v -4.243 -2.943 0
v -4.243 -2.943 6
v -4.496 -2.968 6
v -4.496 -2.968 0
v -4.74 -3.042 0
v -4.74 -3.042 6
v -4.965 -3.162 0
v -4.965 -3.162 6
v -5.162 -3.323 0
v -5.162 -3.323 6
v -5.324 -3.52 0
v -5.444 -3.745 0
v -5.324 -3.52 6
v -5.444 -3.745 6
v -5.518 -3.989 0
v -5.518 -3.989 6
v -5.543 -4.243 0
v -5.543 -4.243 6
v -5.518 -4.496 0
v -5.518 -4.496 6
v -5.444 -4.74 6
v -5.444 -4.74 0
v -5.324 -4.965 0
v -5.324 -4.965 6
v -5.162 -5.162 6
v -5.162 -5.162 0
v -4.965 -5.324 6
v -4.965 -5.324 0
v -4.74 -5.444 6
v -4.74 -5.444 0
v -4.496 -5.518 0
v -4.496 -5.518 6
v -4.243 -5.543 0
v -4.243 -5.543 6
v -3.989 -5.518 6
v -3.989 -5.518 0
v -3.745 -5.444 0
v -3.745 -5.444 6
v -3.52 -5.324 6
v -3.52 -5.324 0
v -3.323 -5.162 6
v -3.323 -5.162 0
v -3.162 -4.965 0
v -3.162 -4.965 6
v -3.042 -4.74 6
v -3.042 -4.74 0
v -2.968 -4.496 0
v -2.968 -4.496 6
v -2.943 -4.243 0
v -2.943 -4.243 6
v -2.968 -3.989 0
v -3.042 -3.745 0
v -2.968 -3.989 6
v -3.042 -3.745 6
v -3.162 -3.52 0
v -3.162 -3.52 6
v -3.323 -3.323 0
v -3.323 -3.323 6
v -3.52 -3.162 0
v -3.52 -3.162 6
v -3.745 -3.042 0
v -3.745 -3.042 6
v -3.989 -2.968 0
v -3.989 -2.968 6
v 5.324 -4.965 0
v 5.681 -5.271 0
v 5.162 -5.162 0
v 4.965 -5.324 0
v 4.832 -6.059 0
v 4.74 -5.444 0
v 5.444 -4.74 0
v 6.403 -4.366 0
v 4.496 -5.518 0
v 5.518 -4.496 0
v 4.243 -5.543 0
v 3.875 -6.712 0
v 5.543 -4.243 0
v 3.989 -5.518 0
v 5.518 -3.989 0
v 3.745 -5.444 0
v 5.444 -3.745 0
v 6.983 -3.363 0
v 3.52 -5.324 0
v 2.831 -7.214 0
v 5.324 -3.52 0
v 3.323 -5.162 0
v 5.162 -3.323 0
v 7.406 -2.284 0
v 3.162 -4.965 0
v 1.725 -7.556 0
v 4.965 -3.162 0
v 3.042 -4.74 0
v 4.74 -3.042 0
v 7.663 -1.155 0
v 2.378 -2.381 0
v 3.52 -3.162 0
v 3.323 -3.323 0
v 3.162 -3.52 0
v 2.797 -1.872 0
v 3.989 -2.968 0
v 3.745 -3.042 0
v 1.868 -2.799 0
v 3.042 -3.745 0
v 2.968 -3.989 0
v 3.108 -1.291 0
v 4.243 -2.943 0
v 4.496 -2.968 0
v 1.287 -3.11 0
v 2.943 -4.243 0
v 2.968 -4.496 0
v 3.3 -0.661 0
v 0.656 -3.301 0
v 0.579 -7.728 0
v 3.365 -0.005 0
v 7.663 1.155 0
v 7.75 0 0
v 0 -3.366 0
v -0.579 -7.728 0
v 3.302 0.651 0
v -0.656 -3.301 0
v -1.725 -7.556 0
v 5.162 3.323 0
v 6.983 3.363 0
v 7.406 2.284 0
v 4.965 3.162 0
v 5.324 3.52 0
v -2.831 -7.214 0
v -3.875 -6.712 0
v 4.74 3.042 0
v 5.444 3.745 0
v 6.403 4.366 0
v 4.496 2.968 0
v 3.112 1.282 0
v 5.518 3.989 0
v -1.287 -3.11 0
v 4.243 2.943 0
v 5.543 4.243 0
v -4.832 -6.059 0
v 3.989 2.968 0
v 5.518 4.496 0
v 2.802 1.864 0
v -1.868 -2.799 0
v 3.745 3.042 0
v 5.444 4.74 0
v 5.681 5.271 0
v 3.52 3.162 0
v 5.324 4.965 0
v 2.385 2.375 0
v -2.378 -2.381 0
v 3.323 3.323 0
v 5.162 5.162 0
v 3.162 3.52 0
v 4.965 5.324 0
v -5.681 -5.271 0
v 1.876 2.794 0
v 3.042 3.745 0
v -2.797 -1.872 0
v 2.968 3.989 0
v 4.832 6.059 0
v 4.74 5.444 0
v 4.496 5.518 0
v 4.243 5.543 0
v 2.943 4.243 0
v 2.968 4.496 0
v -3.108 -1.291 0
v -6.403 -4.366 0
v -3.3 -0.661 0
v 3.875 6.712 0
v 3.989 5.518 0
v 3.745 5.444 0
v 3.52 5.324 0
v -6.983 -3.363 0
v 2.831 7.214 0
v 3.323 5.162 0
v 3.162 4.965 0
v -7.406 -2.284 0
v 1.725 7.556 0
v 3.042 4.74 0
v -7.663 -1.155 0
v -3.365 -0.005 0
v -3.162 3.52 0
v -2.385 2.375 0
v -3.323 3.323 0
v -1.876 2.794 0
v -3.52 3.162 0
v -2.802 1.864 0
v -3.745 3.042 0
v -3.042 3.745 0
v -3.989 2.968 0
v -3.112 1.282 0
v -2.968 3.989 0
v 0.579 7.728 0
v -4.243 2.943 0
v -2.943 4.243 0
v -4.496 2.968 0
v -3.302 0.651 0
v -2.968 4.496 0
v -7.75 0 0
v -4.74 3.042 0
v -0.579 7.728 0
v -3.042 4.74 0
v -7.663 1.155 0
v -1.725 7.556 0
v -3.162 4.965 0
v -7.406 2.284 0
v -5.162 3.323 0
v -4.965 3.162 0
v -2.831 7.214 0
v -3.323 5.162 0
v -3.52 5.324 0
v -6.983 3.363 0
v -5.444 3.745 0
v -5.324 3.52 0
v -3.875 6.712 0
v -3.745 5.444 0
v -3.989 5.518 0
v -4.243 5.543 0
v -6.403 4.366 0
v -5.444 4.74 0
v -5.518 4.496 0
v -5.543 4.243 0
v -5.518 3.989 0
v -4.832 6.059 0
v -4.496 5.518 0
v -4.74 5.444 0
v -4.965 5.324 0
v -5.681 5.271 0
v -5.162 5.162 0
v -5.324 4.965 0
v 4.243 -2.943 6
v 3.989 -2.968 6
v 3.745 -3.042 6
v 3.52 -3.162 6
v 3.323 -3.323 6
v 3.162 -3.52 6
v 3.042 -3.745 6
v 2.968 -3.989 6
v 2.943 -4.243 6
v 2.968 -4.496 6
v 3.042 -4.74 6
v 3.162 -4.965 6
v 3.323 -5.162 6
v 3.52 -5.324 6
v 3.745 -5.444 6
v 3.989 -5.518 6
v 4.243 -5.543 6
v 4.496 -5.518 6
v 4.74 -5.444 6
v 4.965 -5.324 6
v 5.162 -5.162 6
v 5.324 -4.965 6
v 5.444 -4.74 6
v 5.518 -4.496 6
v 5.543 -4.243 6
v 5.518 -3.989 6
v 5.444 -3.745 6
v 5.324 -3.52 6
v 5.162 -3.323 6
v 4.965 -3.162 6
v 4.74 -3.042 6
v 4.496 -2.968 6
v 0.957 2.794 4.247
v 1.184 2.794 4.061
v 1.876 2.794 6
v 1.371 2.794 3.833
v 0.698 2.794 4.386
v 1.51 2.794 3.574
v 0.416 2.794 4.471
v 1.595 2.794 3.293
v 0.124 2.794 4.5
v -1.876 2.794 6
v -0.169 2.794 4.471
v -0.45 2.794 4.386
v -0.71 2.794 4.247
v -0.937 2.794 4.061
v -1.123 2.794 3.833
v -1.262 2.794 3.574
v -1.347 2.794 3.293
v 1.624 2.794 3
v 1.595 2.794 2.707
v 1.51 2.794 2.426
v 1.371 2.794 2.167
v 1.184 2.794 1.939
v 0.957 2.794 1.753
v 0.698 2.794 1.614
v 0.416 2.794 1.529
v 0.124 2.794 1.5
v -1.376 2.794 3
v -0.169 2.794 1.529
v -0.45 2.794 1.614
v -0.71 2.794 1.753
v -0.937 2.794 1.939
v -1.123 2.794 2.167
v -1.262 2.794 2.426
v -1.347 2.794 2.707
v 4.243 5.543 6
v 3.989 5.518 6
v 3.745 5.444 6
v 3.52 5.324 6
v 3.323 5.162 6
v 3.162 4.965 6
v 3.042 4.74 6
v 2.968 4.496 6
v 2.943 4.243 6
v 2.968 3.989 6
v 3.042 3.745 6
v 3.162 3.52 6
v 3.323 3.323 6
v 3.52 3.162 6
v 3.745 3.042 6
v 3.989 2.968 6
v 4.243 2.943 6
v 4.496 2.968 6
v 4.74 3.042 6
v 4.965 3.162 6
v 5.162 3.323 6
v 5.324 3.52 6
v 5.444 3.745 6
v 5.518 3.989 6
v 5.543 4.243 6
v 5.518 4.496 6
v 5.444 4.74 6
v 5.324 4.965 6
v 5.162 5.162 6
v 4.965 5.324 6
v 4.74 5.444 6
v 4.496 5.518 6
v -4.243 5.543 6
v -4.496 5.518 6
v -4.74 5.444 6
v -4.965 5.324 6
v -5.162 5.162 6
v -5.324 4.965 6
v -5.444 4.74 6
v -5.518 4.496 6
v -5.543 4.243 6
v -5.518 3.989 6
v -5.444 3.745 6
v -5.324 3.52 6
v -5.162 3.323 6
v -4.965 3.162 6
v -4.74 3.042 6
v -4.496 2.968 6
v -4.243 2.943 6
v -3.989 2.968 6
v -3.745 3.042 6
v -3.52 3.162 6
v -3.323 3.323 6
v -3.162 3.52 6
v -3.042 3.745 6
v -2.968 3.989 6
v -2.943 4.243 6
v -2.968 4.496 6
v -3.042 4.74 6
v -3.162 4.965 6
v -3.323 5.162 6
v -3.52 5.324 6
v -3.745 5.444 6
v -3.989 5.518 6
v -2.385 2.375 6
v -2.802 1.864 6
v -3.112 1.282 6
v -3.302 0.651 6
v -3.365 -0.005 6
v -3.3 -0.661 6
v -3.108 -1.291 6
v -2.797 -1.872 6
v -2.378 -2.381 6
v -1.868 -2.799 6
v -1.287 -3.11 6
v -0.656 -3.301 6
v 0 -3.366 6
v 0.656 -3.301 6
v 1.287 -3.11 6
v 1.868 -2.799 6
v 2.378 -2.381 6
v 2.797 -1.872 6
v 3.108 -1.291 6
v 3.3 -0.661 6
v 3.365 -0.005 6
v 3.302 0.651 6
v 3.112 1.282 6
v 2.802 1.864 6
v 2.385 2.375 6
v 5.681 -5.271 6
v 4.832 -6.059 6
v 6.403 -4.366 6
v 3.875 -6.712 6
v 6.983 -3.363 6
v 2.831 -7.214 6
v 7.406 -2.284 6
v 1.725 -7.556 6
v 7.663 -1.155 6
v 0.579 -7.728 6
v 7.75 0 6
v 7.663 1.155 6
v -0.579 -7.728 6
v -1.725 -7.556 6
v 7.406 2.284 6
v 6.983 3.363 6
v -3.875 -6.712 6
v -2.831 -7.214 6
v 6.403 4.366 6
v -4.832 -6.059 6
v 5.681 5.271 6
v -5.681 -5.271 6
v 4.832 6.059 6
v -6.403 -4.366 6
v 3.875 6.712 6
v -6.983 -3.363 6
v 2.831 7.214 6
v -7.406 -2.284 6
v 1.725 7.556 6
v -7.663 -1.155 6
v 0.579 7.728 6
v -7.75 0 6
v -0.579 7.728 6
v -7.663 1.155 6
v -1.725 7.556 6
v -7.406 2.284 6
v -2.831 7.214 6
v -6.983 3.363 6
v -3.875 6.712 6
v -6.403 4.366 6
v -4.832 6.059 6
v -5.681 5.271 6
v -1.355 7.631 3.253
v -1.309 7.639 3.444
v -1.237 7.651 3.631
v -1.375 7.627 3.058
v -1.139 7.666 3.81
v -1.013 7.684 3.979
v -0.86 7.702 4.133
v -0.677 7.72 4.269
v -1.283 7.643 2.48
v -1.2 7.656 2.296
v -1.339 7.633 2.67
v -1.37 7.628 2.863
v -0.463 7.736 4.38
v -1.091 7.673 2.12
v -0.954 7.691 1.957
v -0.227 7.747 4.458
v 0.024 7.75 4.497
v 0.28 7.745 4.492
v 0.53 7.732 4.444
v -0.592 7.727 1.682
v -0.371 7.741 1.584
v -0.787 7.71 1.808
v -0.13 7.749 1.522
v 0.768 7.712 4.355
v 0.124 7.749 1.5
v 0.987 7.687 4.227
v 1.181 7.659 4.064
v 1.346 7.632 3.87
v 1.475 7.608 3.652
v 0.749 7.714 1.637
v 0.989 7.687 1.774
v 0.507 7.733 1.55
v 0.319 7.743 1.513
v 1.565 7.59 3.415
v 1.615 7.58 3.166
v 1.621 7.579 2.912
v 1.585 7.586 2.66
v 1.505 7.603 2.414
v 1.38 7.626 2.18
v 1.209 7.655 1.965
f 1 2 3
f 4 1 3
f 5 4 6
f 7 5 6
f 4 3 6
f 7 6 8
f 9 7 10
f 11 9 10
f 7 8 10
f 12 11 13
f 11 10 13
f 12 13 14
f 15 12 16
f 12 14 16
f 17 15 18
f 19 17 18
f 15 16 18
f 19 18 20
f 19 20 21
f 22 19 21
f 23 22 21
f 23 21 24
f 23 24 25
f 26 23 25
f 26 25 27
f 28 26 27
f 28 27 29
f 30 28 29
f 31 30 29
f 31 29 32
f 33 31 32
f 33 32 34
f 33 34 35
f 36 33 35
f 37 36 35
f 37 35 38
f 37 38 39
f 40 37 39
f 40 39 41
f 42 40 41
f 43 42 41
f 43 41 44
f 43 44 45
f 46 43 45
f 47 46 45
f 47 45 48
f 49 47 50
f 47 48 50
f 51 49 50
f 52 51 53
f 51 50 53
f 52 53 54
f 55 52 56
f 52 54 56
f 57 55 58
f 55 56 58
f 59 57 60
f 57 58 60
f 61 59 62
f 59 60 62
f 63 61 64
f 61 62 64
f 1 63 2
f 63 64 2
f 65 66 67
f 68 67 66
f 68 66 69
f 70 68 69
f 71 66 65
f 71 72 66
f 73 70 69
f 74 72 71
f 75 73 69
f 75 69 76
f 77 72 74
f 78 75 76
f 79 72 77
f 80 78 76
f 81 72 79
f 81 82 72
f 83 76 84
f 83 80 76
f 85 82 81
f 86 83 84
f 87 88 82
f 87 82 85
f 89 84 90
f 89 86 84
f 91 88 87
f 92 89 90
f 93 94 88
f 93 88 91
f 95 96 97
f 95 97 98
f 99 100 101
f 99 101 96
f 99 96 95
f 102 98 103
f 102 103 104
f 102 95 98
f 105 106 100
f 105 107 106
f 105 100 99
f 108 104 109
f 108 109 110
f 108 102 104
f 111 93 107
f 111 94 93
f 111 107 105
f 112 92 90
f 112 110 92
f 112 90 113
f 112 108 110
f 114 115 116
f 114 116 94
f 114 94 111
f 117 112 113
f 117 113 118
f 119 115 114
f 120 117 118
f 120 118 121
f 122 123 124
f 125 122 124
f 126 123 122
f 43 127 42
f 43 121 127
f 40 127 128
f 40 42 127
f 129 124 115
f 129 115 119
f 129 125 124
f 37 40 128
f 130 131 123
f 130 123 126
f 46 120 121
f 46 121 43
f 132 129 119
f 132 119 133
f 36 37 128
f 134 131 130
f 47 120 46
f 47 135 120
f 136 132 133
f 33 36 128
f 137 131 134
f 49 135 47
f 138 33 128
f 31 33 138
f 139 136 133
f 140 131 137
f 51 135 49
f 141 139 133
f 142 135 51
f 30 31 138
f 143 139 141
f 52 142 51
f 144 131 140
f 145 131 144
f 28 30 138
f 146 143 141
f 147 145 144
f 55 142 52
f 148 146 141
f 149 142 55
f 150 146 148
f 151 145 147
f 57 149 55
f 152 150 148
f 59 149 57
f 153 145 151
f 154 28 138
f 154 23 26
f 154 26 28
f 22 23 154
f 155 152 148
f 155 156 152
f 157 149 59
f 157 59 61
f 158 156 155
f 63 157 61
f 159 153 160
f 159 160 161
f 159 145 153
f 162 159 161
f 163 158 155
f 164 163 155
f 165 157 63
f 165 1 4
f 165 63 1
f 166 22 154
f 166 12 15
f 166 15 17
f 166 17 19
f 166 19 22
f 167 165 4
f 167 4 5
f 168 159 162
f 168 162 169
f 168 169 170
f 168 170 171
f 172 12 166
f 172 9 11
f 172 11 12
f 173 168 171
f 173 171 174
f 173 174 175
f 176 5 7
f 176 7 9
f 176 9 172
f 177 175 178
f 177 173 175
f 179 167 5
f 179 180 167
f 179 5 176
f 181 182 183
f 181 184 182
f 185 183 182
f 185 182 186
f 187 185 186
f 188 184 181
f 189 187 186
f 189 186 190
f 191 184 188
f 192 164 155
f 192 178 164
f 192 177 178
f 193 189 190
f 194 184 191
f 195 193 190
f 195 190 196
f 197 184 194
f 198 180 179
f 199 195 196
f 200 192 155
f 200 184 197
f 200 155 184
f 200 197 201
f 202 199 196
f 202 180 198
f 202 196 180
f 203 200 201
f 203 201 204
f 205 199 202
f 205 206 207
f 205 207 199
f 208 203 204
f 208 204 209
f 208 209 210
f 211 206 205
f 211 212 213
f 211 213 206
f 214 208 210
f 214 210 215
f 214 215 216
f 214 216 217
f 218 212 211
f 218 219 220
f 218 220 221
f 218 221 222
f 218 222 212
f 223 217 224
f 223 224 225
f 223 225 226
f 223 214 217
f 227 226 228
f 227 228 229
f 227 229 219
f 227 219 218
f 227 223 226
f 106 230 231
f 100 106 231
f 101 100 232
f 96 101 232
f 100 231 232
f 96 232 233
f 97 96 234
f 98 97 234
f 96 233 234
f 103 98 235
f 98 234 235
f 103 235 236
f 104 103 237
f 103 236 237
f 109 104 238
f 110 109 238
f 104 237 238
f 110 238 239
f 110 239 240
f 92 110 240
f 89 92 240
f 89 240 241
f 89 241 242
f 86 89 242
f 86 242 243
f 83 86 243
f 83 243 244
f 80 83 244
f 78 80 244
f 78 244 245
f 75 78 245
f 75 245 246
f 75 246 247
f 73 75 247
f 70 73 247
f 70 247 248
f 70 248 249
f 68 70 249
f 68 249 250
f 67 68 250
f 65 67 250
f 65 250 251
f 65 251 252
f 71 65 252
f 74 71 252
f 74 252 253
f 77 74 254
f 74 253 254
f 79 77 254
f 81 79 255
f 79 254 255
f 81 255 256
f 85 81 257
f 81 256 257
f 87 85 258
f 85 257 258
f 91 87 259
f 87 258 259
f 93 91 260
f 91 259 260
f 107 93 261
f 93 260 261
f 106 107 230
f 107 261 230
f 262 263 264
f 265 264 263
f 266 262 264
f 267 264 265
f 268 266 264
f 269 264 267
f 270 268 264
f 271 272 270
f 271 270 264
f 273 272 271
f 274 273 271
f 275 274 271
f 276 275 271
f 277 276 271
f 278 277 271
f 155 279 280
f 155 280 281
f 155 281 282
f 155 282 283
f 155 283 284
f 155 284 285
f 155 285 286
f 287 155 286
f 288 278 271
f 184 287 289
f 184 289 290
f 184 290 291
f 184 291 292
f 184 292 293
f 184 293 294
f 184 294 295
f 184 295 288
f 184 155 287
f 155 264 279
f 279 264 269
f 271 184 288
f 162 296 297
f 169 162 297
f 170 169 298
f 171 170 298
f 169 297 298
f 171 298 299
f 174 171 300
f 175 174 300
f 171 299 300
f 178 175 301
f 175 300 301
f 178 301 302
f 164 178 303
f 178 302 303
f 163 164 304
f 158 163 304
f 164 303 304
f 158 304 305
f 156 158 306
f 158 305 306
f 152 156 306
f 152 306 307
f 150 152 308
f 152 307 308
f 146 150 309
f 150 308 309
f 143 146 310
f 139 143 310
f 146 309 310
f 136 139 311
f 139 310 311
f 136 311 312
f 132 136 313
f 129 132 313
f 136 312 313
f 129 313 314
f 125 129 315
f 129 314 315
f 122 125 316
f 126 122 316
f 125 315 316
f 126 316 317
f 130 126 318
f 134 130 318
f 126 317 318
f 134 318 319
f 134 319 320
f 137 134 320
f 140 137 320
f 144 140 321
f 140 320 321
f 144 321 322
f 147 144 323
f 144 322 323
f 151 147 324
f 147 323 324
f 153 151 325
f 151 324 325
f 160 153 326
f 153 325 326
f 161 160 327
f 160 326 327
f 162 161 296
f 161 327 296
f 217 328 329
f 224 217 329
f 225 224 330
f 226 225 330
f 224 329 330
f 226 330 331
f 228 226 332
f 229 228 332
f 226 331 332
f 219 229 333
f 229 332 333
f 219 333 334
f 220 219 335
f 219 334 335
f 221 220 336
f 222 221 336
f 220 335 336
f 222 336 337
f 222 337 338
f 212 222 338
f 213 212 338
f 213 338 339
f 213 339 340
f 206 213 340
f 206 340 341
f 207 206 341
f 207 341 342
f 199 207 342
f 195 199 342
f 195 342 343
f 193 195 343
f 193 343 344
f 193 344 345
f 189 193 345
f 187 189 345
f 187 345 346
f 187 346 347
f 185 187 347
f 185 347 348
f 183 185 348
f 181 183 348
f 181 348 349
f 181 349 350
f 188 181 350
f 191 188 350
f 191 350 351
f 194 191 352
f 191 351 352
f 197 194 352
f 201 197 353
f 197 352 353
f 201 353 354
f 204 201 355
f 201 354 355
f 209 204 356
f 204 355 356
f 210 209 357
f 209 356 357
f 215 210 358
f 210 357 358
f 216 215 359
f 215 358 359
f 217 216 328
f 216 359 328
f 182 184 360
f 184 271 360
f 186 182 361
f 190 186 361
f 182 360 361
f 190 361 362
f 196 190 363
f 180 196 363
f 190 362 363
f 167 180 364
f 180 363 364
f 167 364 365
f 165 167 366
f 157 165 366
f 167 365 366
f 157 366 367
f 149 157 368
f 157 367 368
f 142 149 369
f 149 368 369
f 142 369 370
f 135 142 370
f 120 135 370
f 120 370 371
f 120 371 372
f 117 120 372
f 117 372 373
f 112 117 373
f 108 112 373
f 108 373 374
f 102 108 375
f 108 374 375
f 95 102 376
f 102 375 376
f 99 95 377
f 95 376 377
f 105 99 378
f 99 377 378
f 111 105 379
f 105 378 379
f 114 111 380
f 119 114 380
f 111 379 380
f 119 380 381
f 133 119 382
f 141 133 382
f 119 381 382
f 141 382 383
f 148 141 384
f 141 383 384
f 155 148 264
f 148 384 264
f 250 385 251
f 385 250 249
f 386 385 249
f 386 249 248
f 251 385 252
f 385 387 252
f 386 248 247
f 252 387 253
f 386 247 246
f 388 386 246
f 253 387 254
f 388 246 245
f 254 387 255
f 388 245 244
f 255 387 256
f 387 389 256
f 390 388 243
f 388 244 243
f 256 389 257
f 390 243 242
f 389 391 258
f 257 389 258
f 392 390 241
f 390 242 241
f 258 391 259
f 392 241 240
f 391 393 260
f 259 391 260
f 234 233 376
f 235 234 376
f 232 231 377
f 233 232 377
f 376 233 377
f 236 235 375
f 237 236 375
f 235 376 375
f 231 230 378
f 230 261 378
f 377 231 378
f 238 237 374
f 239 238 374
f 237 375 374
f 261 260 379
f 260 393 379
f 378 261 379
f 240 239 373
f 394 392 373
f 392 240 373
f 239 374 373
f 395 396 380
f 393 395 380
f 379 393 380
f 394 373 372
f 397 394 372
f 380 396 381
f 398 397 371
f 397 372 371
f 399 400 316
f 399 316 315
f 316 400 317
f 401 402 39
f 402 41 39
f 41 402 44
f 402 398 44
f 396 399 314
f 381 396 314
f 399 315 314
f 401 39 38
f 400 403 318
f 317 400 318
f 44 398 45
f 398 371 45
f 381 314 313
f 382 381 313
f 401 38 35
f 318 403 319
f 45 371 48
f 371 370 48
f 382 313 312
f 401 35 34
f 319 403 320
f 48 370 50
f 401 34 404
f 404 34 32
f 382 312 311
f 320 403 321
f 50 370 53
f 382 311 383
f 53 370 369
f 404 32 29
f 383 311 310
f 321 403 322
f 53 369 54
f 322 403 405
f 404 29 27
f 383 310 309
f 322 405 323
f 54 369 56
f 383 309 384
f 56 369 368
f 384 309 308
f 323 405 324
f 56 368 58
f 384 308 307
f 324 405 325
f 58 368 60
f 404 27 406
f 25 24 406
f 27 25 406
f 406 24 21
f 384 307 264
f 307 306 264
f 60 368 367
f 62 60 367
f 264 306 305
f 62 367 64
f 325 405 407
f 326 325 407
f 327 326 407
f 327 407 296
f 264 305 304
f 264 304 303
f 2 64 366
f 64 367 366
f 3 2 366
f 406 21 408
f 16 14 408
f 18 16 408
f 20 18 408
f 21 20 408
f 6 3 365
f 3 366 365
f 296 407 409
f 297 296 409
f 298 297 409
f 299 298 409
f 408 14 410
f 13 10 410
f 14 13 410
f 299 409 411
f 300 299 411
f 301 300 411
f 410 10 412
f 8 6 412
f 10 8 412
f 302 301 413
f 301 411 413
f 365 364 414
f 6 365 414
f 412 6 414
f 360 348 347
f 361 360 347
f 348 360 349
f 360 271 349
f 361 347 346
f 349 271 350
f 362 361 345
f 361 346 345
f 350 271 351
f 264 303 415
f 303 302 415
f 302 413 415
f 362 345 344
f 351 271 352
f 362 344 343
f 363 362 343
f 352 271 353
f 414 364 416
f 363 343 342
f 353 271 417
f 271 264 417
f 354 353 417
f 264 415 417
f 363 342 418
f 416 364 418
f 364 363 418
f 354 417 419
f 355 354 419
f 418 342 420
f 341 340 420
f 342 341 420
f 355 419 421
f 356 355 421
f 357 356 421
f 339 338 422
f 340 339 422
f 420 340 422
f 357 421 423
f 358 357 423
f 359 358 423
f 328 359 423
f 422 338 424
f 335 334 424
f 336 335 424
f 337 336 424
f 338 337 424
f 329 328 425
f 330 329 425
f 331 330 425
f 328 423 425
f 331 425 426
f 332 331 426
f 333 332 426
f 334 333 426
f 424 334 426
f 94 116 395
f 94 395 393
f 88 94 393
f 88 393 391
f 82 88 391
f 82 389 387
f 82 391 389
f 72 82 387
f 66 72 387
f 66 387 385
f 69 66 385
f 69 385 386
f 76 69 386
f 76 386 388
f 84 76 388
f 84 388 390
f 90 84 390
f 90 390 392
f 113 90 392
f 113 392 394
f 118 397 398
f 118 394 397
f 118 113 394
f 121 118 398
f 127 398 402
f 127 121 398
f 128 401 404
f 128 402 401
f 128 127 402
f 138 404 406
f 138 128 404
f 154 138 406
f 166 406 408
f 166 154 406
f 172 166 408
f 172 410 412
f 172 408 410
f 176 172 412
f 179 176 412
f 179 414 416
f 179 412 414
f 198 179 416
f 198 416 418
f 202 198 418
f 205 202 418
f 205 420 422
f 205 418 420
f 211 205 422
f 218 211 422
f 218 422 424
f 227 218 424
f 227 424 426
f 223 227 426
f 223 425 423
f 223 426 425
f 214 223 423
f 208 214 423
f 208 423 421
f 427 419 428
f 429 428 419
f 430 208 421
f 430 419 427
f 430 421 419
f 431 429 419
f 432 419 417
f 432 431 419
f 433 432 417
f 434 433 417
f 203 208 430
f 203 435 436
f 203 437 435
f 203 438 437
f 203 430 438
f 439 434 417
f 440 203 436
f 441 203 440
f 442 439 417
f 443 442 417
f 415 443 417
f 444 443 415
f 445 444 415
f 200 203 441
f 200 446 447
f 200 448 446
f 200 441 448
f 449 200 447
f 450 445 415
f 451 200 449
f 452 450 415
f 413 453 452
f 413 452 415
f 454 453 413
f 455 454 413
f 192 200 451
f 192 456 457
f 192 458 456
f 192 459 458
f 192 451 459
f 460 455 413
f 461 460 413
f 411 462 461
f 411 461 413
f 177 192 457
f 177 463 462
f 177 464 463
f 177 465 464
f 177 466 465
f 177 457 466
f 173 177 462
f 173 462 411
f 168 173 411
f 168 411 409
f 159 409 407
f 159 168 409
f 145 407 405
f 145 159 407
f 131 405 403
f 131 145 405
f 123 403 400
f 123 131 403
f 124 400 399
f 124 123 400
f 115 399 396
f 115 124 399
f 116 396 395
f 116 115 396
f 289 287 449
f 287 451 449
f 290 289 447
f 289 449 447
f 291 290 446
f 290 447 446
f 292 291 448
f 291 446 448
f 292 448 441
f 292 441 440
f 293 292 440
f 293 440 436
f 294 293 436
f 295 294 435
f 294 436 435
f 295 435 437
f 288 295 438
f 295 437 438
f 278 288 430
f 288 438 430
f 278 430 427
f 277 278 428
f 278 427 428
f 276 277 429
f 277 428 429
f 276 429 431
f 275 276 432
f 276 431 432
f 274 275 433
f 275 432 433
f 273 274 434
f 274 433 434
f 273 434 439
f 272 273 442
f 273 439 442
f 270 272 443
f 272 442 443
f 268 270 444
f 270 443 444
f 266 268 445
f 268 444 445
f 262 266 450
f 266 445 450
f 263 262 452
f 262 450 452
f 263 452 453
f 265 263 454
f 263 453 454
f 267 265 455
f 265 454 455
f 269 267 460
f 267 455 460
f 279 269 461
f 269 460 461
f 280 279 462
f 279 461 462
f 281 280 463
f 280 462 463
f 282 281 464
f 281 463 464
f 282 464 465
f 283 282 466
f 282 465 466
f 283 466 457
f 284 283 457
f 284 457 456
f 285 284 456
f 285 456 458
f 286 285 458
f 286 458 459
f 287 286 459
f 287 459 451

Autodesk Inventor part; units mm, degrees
ref_plane "YZ Plane" through (0, 0, 0) normal (1, 0, 0) x (0, 1, 0)
ref_plane "XZ Plane" through (0, 0, 0) normal (0, 1, 0) x (-1, 0, 0)
ref_plane "XY Plane" through (0, 0, 0) normal (0, 0, 1) x (1, 0, 0)
sketch "Sketch6" plane through (0, 0, 0) normal (0, 0, 1) x (1, 0, 0)
  circle A0 centre (0, 0) radius 7.75
  dimension "d44" = 15.5
extrude "Extrusion5" add sketch "Sketch6" along normal blind 6
sketch "Sketch7" plane through (0, 0, 0) normal (0, 0, -1) x (-1, 0, 0)
  point P0 (0, 0)
  point P1 (4.2426, 4.2426)
  point P2 (-4.2426, 4.2426)
  point P3 (-4.2426, -4.2426)
  point P4 (4.2426, -4.2426)
  dimension "d47" = 6
  dimension "d50" = 360
  dimension "d74" = 4.2426
hole "Hole4" at (-4.2426, 4.2426, 0) at (4.2426, 4.2426, 0) at (4.2426, -4.2426, 0) at (-4.2426, -4.2426, 0) direction (0, 0, 1) diameter 2.6 end through all
hole "Hole5" at (0, 0, 0) direction (0, 0, 1) diameter 6.731 end through all
sketch "Sketch8" plane through (0, 0, 0) normal (0, 0, -1) x (-1, 0, 0)
  circle A0 centre (0, 0) radius 3.3655 projected
  line L0 (-1.8762, 2.794) -> (1.8762, 2.794)
  line L1 (1.8762, 2.794) -> (1.8762, 3.429)
  line L2 (1.8762, 3.429) -> (-1.8762, 3.429)
  line L3 (-1.8762, 3.429) -> (-1.8762, 2.794)
  dimension "d70" = 2.794
  dimension "d71" = 0.635
extrude "Extrusion6" add sketch "Sketch8" against normal blind 6 contours L0 A0 picked at (-0.1324, 2.9767)
sketch "Sketch9" plane through (-1.8762, 2.794, 0) normal (0, -1, 0) x (1, 0, 0)
  line L0 (0, 0) -> (0, 6) projected
  line L1 (3.7524, 0) -> (0, 0) projected
  point P0 (2, 3)
  dimension "d75" = 2
  dimension "d85" = 3
hole "Hole6" at (0.1238, 2.794, 3) direction (0, 1, 0) diameter 3 end through all
properties part number "omniWheelInsert"
